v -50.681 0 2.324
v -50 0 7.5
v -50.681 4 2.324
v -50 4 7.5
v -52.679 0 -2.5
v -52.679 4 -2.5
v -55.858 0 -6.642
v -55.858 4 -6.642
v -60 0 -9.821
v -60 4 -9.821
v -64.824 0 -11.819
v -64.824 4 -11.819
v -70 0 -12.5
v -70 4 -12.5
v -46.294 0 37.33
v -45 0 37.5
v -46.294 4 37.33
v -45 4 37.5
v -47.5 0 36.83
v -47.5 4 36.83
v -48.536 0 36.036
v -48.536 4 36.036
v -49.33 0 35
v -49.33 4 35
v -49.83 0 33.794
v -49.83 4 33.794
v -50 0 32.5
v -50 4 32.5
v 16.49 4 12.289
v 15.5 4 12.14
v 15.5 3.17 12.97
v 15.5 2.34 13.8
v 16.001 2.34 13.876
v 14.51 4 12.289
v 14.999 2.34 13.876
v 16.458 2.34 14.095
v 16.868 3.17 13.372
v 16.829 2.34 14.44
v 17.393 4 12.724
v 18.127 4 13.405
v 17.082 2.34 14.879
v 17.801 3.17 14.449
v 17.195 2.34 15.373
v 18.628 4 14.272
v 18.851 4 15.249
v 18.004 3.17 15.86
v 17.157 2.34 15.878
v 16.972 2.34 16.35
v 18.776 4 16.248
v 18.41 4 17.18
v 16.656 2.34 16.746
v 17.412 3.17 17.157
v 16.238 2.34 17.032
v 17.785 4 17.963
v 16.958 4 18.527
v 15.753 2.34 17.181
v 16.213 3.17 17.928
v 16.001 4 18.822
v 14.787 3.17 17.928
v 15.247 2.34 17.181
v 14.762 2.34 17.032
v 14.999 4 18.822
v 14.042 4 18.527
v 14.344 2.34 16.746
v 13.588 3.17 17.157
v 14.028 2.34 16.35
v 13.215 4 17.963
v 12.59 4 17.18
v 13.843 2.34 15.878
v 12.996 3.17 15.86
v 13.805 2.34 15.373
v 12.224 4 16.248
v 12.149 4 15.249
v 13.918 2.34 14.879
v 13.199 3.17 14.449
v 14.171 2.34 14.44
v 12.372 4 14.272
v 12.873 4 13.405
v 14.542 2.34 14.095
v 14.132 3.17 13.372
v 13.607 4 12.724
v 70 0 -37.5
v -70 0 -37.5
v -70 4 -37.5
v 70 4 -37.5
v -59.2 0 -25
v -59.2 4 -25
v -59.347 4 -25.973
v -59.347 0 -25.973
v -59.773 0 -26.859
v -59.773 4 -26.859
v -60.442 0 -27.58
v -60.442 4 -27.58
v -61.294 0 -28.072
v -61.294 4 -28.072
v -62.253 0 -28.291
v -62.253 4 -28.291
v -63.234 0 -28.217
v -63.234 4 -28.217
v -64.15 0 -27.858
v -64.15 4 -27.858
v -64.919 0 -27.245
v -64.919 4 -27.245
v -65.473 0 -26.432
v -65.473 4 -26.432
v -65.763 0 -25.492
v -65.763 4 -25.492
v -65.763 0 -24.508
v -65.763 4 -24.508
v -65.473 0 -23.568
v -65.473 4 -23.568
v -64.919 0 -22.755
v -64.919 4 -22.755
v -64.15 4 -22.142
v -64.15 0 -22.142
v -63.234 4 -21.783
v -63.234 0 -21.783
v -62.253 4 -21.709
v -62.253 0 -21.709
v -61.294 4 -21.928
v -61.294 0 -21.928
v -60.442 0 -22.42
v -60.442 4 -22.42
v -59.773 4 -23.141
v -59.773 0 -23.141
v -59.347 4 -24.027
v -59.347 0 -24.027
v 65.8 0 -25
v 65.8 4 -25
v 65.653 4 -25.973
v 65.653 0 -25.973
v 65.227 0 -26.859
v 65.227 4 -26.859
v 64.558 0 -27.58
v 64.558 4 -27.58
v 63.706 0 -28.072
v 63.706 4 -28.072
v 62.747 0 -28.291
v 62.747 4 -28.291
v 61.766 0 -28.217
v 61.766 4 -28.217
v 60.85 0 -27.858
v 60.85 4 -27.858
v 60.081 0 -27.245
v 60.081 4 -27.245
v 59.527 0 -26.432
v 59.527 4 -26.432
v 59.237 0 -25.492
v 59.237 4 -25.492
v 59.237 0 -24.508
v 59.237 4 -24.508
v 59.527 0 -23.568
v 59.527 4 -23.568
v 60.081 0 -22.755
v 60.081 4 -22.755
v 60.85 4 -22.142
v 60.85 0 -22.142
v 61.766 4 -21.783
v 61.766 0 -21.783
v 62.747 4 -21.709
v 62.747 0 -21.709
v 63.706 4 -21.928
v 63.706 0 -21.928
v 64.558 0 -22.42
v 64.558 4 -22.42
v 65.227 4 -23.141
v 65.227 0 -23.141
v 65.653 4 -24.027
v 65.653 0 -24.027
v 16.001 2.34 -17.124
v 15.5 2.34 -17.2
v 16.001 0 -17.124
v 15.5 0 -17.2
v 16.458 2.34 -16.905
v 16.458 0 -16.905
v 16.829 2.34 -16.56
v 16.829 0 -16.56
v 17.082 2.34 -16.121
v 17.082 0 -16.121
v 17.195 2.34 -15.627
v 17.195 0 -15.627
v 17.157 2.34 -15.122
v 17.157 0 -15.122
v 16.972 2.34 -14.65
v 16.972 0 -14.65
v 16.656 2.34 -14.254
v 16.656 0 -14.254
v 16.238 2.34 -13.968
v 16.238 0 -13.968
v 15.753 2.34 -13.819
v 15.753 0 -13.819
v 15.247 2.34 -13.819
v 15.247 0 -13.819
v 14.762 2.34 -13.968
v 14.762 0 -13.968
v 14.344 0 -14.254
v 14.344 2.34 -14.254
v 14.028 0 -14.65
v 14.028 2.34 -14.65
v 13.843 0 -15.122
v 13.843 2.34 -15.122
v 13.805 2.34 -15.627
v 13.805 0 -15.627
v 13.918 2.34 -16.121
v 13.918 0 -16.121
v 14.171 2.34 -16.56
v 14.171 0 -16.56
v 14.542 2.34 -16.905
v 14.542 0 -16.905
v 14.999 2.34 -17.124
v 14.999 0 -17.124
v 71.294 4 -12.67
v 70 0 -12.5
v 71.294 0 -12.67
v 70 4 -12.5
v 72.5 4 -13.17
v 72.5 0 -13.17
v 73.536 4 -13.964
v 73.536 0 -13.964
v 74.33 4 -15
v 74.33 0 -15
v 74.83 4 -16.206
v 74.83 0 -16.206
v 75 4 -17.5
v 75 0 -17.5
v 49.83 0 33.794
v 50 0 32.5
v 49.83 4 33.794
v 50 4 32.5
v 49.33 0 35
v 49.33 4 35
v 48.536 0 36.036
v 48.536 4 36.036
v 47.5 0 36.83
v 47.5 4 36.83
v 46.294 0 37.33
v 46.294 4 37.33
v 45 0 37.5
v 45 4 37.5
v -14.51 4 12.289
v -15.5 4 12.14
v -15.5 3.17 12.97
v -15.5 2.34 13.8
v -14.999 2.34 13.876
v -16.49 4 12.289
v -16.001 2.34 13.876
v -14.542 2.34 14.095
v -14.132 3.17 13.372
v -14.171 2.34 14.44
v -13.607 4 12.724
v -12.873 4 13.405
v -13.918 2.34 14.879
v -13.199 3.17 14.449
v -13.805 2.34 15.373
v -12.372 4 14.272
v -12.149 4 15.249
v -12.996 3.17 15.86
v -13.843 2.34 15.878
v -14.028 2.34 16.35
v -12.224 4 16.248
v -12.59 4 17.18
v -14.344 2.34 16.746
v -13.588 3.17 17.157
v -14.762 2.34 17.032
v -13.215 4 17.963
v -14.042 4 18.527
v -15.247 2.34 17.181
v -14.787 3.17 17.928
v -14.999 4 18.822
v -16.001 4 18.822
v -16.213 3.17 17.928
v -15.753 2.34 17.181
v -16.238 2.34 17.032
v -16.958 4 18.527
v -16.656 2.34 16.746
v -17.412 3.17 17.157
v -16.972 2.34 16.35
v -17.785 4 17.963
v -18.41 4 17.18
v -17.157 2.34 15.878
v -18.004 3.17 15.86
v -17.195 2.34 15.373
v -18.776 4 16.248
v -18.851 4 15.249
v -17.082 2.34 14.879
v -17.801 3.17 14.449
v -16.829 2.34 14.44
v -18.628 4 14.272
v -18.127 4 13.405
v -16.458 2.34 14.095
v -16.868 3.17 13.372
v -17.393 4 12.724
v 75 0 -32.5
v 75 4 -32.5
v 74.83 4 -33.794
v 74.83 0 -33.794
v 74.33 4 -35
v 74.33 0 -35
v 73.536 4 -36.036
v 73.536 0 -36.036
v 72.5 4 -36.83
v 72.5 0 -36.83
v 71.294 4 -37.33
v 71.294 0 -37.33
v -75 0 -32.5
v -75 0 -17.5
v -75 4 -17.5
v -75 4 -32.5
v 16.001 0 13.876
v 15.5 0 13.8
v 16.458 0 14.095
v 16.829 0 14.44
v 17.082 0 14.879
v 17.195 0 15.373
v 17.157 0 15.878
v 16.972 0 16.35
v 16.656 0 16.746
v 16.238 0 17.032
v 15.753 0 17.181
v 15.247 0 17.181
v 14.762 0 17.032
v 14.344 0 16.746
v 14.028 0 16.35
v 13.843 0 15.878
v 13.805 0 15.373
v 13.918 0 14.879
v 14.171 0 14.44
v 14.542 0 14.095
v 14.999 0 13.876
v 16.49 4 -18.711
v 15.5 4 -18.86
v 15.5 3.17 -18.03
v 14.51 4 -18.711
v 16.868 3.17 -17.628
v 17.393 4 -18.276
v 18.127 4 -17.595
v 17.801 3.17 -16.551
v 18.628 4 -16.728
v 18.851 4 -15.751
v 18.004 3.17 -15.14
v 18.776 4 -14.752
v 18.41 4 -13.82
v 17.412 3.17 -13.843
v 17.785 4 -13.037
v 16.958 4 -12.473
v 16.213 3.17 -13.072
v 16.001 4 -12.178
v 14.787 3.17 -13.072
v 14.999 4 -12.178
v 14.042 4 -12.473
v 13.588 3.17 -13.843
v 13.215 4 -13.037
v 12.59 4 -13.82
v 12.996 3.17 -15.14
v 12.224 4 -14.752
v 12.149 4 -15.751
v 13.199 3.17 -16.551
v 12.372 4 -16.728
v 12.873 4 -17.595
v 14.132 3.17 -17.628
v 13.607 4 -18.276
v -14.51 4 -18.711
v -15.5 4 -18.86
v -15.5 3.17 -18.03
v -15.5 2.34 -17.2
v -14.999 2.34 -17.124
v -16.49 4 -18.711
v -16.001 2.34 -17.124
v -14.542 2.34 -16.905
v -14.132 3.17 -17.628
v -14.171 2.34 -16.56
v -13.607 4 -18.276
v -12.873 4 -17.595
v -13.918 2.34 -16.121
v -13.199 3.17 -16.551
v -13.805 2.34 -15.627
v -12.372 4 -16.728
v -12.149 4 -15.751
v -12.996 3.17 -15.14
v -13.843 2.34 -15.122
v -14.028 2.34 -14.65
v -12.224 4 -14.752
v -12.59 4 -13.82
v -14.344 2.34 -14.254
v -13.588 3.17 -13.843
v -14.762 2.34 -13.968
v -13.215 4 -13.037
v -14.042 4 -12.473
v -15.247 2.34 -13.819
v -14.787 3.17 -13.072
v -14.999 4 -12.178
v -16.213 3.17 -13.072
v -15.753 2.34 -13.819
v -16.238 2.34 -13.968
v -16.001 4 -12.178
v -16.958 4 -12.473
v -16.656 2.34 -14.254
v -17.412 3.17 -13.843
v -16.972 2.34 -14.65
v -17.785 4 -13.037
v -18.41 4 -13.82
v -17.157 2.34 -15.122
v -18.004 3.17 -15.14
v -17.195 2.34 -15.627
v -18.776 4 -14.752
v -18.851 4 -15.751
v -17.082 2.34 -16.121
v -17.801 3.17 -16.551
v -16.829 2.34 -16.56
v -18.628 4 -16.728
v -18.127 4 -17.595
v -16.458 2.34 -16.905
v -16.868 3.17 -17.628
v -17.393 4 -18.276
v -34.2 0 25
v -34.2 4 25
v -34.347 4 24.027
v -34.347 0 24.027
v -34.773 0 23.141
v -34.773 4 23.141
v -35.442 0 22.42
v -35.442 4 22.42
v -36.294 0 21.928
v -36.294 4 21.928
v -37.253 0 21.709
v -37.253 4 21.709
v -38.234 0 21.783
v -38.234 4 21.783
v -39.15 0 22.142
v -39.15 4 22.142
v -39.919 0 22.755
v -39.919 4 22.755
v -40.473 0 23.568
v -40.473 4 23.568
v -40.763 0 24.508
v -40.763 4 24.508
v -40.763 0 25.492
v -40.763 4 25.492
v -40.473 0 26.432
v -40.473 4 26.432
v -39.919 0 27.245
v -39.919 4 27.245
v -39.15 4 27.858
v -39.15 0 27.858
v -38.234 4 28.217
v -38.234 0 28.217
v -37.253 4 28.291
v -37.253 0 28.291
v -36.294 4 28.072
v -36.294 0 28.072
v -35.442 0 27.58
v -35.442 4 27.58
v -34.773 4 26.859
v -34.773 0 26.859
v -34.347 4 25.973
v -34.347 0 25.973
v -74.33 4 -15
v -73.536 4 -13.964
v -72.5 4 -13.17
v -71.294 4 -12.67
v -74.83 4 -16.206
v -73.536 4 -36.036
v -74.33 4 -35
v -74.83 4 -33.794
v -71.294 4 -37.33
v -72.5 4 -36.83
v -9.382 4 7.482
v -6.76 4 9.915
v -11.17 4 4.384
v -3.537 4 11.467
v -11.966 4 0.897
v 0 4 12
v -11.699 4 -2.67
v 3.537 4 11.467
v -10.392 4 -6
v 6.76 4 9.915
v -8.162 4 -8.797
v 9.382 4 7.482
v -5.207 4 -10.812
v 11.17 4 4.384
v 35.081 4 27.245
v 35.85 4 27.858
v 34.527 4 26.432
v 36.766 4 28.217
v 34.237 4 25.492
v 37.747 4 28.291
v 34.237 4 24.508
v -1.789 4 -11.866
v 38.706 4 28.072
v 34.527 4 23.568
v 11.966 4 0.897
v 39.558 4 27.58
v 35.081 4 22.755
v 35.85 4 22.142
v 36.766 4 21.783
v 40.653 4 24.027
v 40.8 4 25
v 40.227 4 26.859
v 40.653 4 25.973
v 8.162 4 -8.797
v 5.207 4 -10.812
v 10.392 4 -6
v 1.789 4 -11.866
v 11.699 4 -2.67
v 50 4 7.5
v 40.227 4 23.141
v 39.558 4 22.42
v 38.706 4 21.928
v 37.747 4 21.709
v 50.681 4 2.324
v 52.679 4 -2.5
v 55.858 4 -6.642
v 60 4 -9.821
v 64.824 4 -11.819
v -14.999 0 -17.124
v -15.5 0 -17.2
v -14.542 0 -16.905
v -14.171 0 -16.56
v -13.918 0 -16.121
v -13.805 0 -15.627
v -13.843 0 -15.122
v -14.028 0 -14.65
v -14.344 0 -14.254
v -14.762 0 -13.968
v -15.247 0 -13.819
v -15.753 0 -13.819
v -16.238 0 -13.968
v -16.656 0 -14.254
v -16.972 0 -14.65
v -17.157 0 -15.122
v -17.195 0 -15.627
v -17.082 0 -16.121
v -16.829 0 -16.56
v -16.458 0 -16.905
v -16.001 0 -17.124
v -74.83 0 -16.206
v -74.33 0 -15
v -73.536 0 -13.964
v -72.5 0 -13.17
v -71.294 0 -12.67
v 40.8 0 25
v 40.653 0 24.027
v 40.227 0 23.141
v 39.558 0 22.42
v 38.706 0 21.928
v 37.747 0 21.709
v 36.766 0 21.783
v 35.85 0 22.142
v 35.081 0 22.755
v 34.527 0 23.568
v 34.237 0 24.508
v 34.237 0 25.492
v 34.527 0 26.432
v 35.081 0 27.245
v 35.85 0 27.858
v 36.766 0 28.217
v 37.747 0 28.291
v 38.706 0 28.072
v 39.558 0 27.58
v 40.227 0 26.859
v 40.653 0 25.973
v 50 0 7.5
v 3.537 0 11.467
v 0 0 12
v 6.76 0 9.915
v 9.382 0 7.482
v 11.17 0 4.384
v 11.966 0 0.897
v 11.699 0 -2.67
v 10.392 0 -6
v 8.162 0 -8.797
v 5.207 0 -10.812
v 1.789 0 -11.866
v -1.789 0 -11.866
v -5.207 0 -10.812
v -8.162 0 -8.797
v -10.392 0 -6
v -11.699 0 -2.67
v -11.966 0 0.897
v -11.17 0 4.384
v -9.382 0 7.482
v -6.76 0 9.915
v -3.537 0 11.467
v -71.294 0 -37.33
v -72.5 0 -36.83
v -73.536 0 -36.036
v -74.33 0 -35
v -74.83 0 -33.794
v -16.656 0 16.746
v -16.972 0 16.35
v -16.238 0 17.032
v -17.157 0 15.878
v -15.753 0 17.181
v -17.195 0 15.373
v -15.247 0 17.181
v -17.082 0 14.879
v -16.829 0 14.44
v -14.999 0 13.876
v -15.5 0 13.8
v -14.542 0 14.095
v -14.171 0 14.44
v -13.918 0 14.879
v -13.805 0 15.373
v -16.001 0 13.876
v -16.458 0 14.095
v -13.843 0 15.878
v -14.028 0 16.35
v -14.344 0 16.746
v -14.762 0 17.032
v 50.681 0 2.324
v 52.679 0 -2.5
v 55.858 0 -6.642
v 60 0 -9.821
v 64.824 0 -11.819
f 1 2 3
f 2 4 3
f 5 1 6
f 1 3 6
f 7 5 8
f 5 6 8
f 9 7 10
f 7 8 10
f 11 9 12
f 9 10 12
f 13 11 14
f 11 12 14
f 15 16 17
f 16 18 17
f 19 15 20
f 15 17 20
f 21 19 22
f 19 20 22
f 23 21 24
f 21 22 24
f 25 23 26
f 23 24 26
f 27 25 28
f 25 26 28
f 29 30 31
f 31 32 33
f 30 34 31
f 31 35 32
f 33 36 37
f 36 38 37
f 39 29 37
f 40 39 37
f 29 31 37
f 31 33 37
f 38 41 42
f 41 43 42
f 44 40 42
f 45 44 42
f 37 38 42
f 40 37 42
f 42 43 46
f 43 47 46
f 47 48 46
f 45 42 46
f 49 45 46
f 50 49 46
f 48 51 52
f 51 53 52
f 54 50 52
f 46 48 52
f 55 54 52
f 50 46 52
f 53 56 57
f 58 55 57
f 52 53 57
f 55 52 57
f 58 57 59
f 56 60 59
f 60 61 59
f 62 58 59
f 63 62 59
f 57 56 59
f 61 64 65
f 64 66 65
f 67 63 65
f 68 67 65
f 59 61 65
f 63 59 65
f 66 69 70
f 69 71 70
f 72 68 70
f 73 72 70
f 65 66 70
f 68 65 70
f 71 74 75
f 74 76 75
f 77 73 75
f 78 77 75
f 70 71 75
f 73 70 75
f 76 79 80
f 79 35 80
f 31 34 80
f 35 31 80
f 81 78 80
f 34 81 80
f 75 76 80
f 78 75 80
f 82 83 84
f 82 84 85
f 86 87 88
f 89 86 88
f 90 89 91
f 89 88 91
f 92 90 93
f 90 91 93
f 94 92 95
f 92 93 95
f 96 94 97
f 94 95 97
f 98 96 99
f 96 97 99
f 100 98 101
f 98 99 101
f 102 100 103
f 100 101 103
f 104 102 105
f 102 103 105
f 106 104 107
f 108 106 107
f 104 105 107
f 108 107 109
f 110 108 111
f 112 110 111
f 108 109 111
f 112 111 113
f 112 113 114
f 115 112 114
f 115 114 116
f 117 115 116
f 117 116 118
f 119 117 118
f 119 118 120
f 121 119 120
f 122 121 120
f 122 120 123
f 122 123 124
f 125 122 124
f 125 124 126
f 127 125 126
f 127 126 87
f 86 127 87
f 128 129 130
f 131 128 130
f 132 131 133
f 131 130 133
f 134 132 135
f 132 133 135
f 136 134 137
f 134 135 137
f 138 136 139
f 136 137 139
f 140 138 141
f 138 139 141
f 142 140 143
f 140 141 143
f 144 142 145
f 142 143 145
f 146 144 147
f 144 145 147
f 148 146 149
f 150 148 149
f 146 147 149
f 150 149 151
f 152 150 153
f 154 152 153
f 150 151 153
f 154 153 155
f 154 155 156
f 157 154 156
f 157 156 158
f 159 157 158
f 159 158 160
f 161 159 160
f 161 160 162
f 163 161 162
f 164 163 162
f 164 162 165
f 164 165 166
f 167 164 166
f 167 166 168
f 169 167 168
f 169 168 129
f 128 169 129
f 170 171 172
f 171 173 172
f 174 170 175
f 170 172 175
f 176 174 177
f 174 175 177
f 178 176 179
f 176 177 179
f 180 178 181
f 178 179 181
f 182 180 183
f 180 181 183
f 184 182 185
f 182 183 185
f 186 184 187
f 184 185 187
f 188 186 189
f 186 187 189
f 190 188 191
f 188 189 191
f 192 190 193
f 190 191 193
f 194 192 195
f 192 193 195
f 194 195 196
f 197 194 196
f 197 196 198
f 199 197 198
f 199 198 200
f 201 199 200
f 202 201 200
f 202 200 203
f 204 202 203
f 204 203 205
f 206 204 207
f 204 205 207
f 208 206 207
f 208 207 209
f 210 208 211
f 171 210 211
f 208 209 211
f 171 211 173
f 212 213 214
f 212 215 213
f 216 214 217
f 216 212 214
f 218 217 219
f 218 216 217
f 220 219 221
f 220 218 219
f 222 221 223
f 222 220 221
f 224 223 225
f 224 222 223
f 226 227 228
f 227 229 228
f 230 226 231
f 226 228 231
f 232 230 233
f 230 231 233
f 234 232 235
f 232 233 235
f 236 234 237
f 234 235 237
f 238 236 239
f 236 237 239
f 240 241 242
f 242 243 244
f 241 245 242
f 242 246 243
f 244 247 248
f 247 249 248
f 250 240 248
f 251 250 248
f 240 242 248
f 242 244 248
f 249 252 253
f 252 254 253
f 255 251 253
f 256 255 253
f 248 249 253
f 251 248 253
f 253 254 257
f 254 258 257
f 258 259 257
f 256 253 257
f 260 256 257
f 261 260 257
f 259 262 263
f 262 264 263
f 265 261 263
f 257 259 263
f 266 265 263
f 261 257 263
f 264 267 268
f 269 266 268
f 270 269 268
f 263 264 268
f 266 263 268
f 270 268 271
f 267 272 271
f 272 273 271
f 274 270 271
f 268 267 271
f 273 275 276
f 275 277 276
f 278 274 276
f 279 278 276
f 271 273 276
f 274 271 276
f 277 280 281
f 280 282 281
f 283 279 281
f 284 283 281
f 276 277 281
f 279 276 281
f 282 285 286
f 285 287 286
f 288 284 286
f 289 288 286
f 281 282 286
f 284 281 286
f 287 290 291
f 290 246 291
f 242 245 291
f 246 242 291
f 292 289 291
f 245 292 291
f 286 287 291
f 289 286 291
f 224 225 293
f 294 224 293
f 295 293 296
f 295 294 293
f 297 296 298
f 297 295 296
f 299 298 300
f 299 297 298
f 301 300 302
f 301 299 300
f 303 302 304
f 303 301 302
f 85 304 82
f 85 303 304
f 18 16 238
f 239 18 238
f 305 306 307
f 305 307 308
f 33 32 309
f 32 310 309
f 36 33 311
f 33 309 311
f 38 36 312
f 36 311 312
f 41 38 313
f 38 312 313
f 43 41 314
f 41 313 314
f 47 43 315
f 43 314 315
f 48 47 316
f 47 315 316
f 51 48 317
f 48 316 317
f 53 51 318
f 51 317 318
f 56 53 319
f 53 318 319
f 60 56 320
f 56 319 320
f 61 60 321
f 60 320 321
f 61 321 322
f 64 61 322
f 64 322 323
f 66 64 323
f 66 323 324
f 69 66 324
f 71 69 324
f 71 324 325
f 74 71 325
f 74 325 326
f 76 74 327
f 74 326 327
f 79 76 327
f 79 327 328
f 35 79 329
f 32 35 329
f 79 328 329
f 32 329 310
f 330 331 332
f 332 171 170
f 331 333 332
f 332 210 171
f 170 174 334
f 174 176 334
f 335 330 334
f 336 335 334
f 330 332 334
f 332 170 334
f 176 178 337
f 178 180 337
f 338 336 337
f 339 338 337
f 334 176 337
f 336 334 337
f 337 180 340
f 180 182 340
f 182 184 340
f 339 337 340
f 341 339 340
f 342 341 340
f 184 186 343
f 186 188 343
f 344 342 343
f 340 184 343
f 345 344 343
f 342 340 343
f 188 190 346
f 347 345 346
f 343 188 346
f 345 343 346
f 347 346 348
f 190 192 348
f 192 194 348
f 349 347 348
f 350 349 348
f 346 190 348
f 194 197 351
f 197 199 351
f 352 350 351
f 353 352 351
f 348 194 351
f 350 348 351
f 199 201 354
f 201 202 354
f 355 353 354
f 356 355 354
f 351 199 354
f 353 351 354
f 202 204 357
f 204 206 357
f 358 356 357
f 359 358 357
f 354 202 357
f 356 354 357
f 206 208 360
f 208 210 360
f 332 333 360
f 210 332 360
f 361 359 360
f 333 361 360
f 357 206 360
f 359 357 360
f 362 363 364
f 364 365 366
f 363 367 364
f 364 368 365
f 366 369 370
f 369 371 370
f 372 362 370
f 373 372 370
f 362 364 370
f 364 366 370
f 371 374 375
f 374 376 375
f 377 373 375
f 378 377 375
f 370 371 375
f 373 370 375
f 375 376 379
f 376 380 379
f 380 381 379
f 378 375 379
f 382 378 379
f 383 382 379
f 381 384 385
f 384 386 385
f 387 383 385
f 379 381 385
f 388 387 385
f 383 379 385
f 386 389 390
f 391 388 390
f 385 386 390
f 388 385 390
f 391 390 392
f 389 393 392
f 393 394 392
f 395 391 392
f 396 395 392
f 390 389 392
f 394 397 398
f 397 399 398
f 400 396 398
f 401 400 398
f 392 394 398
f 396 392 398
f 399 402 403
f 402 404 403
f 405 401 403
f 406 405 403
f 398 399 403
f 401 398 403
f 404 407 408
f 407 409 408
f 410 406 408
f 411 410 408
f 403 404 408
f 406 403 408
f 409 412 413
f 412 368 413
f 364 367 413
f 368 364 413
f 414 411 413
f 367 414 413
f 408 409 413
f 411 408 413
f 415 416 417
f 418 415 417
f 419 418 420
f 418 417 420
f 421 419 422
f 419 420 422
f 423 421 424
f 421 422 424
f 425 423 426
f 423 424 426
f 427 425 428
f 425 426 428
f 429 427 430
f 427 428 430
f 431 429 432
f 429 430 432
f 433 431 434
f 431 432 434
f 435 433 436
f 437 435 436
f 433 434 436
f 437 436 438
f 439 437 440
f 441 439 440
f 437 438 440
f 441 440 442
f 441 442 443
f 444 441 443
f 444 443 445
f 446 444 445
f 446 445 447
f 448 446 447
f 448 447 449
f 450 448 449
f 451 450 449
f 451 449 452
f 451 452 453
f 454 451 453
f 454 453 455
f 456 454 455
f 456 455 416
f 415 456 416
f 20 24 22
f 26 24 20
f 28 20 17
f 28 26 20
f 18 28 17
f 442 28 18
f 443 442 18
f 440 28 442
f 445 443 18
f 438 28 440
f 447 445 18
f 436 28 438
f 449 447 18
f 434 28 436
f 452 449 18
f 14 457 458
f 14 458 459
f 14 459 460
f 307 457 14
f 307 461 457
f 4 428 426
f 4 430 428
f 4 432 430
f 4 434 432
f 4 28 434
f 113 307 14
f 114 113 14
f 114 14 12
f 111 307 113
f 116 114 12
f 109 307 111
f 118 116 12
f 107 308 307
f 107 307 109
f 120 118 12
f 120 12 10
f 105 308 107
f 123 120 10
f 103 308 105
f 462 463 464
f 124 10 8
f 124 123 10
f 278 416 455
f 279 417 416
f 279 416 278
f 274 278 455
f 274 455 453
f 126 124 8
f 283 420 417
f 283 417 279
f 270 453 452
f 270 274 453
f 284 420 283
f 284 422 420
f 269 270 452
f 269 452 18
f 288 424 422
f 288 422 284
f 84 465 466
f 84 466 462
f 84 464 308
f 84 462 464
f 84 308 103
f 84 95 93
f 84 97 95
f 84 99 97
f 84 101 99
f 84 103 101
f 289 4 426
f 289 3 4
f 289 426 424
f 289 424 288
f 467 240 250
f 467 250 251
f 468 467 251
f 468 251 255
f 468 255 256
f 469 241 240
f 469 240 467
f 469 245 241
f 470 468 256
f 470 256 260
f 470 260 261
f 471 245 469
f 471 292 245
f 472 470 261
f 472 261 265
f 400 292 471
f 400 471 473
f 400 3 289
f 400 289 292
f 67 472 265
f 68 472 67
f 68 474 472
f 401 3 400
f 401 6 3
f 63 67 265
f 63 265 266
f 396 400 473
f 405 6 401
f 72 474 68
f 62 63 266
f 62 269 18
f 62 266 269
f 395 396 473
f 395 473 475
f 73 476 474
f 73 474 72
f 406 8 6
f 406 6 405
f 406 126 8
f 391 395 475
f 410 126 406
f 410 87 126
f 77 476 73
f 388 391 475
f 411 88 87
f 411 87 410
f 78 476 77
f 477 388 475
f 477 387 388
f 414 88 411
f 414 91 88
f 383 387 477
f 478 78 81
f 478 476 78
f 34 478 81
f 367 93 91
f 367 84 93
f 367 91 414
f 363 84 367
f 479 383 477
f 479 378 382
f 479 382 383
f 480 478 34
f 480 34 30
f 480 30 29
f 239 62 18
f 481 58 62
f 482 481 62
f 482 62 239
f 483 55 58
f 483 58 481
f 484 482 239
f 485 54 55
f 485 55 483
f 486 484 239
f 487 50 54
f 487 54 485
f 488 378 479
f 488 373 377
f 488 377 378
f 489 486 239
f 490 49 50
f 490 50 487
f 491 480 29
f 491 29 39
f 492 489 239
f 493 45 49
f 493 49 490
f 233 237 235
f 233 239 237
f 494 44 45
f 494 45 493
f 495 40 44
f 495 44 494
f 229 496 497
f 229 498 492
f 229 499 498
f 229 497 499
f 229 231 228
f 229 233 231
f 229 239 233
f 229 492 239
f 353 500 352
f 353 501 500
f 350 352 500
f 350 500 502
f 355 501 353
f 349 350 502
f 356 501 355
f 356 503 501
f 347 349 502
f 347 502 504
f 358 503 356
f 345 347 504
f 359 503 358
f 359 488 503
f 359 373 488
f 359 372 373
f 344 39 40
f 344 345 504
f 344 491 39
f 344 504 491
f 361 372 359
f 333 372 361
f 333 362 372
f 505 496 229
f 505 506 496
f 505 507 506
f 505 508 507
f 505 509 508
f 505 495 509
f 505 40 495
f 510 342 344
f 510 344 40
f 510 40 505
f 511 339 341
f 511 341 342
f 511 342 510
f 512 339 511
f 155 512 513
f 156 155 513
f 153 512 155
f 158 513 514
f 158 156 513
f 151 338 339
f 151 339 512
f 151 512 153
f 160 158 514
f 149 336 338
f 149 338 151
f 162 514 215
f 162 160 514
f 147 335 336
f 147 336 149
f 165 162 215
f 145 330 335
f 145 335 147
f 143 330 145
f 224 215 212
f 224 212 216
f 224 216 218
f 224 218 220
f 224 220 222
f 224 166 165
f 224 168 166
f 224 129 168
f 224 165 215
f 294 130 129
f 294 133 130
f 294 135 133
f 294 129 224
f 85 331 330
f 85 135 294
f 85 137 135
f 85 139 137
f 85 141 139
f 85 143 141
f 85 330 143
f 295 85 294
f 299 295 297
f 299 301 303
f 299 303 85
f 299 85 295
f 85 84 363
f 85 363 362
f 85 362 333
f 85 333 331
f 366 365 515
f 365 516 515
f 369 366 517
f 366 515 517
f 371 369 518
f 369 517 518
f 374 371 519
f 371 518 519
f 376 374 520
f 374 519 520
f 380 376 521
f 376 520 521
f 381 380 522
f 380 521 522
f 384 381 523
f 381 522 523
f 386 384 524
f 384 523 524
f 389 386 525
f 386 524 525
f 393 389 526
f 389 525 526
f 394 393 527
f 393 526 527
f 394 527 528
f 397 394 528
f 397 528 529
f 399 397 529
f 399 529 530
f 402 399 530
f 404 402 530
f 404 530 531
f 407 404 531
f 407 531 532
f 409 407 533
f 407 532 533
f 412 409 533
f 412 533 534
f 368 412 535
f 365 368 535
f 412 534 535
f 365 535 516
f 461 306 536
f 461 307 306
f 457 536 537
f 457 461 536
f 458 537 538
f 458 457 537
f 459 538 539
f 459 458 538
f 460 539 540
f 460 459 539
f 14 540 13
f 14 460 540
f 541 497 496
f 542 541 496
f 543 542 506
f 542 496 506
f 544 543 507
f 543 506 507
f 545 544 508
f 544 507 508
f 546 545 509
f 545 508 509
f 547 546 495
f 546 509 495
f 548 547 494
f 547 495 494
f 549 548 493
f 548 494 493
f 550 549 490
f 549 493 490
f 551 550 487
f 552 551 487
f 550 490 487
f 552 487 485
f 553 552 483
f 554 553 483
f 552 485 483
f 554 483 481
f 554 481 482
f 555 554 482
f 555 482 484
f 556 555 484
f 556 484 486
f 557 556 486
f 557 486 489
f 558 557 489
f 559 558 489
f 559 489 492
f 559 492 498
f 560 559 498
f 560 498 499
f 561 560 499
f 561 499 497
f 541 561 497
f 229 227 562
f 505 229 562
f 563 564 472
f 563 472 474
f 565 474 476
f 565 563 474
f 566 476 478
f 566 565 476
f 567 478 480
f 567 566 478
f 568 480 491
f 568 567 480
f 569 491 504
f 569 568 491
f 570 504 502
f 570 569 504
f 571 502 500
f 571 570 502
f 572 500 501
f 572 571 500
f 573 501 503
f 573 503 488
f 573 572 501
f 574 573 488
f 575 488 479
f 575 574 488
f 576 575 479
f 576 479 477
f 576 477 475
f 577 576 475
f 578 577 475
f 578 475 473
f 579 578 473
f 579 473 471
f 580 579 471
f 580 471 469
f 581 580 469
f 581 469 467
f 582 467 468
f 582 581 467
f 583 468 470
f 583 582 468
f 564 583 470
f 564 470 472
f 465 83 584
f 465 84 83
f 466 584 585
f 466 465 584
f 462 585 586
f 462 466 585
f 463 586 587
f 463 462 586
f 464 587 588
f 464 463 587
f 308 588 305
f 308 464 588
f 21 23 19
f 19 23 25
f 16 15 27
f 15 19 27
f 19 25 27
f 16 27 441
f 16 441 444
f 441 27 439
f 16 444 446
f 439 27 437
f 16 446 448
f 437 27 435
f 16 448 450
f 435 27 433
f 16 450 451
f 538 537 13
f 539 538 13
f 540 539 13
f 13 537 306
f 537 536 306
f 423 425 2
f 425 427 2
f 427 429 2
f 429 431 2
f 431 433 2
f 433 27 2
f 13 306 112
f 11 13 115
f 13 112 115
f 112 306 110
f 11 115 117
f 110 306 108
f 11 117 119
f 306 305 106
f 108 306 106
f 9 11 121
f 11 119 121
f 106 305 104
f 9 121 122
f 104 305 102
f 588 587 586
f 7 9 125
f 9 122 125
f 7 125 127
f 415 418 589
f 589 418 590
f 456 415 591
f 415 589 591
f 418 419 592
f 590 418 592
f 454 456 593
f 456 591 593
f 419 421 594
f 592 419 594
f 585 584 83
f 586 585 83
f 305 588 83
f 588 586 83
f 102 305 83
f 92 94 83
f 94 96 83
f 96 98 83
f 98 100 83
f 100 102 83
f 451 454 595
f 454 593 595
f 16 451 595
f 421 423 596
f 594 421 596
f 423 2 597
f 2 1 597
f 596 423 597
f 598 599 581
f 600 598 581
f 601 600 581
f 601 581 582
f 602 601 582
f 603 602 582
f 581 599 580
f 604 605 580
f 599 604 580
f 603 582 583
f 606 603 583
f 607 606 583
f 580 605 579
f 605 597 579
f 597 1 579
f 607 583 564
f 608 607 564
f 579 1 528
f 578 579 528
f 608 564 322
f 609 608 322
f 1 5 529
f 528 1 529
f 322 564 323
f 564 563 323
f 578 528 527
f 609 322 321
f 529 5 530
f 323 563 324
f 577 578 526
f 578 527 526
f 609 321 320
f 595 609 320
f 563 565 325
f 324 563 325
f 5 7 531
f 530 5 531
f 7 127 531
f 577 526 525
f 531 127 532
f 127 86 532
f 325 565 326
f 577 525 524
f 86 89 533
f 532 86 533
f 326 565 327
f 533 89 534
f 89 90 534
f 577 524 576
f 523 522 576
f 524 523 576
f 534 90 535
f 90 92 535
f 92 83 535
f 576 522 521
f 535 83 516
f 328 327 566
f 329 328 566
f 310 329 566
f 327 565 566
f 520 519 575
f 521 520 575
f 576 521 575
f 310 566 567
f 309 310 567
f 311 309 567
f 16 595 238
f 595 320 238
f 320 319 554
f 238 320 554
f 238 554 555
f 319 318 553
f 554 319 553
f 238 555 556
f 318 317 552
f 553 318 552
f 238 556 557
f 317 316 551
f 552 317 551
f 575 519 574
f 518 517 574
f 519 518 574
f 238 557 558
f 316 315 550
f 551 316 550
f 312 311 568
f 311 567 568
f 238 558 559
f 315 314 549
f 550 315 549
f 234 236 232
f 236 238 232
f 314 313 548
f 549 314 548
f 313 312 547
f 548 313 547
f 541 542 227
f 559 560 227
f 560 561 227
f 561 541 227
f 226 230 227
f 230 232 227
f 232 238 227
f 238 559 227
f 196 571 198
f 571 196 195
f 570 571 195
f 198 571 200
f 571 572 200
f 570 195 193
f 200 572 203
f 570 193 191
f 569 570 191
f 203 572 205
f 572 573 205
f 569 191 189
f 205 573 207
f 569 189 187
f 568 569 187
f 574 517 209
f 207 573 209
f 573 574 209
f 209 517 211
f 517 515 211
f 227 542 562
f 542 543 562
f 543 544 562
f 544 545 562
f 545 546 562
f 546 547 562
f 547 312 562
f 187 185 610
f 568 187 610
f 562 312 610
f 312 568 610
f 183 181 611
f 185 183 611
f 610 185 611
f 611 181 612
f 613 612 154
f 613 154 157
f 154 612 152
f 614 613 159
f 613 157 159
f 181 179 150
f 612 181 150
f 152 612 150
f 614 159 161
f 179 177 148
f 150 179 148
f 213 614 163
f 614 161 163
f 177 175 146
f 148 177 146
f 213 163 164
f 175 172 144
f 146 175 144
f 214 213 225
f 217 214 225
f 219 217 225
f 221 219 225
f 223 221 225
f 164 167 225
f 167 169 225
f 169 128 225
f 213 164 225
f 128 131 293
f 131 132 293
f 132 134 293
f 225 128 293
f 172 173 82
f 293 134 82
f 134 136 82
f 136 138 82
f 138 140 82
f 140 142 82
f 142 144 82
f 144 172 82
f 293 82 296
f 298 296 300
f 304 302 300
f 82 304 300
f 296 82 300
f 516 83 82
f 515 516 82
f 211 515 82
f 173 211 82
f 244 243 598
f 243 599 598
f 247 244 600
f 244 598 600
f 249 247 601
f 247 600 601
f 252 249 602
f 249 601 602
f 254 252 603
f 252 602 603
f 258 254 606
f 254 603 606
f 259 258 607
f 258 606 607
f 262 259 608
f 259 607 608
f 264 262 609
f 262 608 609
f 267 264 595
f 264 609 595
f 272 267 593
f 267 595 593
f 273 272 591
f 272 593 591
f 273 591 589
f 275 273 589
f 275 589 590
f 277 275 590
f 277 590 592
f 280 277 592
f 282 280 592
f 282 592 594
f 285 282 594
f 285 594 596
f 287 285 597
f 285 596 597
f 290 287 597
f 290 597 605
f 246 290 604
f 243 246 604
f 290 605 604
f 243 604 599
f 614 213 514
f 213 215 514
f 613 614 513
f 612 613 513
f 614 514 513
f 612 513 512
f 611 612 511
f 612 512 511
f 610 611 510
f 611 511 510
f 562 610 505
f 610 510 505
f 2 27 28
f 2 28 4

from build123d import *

# Parameters (mm, degrees)
SKETCH1_W                                            = 25
SKETCH1_H                                            = 25
SKETCH1_W_2                                          = 100
SKETCH1_H_2                                          = 75
SKETCH1_R                                            = 12
BOSS_EXTRUDE1_DEPTH                                  = 4
CSK_FOR_M3_HEX_SOCKET_COUNTERSUNK_CAP_SC_D           = 3.4
CSK_FOR_M3_HEX_SOCKET_COUNTERSUNK_CAP_SC_CSINK_D     = 6.72
CSK_FOR_M3_HEX_SOCKET_COUNTERSUNK_CAP_SC_CSINK_ANGLE = 90
M6_CLEARANCE_HOLE2_D                                 = 6.6
FILLET1_R                                            = 5
FILLET2_R                                            = 20


with BuildPart() as part:
    # Sketch1 → Boss-Extrude1 (new body)
    # profile 1 of 3: a face of its own
    with BuildSketch(Plane(origin=(0, 0, 0), x_dir=(1, 0, 0), z_dir=(0, 1, 0))):
        with Locations((-62.5, 25)):
            Rectangle(SKETCH1_W, SKETCH1_H)
    # profile 2 of 3: a face of its own
    with BuildSketch(Plane(origin=(0, 0, 0), x_dir=(1, 0, 0), z_dir=(0, 1, 0))):
        Rectangle(SKETCH1_W_2, SKETCH1_H_2)
        with Locations(Location((0, 0, 0), (0, 0, 270))):
            Circle(SKETCH1_R, mode=Mode.SUBTRACT)
    # profile 3 of 3: a face of its own
    with BuildSketch(Plane(origin=(0, 0, 0), x_dir=(1, 0, 0), z_dir=(0, 1, 0))):
        with Locations((62.5, 25)):
            Rectangle(SKETCH1_W, SKETCH1_H)
    extrude(amount=BOSS_EXTRUDE1_DEPTH)

    # CSK for M3 Hex Socket Countersunk Cap Screw1 (through all)
    with Locations(Plane(origin=(-15.5, 4, 15.5), x_dir=(0, 0, 1), z_dir=(0, 1, 0))):
        with Locations((0, 0), (0, 31), (-31, 31), (-31, 0)):
            CounterSinkHole(CSK_FOR_M3_HEX_SOCKET_COUNTERSUNK_CAP_SC_D / 2, CSK_FOR_M3_HEX_SOCKET_COUNTERSUNK_CAP_SC_CSINK_D / 2, counter_sink_angle=CSK_FOR_M3_HEX_SOCKET_COUNTERSUNK_CAP_SC_CSINK_ANGLE)

    # M6 Clearance Hole2 (through all)
    with Locations(Plane(origin=(0, 0, 0), x_dir=(-1, 0, 0), z_dir=(0, -1, 0))):
        with Locations((62.5, 25), (37.5, -25), (-37.5, -25), (-62.5, 25)):
            Hole(M6_CLEARANCE_HOLE2_D / 2)

    # Fillet1
    fillet1_edges = [part.edges().sort_by_distance(p)[0] for p in [
        (75, 2, -37.5),
        (75, 2, -12.5),
        (50, 2, 37.5),
        (-50, 2, 37.5),
        (-75, 2, -12.5),
        (-75, 2, -37.5),
    ]]
    fillet(fillet1_edges, radius=FILLET1_R)

    # Fillet2
    fillet2_edges = [part.edges().sort_by_distance(p)[0] for p in [
        (50, 2, -12.5),
        (-50, 2, -12.5),
    ]]
    fillet(fillet2_edges, radius=FILLET2_R - 0.0001)  # a hair under: the kernel refuses the full size


solid = part.part
